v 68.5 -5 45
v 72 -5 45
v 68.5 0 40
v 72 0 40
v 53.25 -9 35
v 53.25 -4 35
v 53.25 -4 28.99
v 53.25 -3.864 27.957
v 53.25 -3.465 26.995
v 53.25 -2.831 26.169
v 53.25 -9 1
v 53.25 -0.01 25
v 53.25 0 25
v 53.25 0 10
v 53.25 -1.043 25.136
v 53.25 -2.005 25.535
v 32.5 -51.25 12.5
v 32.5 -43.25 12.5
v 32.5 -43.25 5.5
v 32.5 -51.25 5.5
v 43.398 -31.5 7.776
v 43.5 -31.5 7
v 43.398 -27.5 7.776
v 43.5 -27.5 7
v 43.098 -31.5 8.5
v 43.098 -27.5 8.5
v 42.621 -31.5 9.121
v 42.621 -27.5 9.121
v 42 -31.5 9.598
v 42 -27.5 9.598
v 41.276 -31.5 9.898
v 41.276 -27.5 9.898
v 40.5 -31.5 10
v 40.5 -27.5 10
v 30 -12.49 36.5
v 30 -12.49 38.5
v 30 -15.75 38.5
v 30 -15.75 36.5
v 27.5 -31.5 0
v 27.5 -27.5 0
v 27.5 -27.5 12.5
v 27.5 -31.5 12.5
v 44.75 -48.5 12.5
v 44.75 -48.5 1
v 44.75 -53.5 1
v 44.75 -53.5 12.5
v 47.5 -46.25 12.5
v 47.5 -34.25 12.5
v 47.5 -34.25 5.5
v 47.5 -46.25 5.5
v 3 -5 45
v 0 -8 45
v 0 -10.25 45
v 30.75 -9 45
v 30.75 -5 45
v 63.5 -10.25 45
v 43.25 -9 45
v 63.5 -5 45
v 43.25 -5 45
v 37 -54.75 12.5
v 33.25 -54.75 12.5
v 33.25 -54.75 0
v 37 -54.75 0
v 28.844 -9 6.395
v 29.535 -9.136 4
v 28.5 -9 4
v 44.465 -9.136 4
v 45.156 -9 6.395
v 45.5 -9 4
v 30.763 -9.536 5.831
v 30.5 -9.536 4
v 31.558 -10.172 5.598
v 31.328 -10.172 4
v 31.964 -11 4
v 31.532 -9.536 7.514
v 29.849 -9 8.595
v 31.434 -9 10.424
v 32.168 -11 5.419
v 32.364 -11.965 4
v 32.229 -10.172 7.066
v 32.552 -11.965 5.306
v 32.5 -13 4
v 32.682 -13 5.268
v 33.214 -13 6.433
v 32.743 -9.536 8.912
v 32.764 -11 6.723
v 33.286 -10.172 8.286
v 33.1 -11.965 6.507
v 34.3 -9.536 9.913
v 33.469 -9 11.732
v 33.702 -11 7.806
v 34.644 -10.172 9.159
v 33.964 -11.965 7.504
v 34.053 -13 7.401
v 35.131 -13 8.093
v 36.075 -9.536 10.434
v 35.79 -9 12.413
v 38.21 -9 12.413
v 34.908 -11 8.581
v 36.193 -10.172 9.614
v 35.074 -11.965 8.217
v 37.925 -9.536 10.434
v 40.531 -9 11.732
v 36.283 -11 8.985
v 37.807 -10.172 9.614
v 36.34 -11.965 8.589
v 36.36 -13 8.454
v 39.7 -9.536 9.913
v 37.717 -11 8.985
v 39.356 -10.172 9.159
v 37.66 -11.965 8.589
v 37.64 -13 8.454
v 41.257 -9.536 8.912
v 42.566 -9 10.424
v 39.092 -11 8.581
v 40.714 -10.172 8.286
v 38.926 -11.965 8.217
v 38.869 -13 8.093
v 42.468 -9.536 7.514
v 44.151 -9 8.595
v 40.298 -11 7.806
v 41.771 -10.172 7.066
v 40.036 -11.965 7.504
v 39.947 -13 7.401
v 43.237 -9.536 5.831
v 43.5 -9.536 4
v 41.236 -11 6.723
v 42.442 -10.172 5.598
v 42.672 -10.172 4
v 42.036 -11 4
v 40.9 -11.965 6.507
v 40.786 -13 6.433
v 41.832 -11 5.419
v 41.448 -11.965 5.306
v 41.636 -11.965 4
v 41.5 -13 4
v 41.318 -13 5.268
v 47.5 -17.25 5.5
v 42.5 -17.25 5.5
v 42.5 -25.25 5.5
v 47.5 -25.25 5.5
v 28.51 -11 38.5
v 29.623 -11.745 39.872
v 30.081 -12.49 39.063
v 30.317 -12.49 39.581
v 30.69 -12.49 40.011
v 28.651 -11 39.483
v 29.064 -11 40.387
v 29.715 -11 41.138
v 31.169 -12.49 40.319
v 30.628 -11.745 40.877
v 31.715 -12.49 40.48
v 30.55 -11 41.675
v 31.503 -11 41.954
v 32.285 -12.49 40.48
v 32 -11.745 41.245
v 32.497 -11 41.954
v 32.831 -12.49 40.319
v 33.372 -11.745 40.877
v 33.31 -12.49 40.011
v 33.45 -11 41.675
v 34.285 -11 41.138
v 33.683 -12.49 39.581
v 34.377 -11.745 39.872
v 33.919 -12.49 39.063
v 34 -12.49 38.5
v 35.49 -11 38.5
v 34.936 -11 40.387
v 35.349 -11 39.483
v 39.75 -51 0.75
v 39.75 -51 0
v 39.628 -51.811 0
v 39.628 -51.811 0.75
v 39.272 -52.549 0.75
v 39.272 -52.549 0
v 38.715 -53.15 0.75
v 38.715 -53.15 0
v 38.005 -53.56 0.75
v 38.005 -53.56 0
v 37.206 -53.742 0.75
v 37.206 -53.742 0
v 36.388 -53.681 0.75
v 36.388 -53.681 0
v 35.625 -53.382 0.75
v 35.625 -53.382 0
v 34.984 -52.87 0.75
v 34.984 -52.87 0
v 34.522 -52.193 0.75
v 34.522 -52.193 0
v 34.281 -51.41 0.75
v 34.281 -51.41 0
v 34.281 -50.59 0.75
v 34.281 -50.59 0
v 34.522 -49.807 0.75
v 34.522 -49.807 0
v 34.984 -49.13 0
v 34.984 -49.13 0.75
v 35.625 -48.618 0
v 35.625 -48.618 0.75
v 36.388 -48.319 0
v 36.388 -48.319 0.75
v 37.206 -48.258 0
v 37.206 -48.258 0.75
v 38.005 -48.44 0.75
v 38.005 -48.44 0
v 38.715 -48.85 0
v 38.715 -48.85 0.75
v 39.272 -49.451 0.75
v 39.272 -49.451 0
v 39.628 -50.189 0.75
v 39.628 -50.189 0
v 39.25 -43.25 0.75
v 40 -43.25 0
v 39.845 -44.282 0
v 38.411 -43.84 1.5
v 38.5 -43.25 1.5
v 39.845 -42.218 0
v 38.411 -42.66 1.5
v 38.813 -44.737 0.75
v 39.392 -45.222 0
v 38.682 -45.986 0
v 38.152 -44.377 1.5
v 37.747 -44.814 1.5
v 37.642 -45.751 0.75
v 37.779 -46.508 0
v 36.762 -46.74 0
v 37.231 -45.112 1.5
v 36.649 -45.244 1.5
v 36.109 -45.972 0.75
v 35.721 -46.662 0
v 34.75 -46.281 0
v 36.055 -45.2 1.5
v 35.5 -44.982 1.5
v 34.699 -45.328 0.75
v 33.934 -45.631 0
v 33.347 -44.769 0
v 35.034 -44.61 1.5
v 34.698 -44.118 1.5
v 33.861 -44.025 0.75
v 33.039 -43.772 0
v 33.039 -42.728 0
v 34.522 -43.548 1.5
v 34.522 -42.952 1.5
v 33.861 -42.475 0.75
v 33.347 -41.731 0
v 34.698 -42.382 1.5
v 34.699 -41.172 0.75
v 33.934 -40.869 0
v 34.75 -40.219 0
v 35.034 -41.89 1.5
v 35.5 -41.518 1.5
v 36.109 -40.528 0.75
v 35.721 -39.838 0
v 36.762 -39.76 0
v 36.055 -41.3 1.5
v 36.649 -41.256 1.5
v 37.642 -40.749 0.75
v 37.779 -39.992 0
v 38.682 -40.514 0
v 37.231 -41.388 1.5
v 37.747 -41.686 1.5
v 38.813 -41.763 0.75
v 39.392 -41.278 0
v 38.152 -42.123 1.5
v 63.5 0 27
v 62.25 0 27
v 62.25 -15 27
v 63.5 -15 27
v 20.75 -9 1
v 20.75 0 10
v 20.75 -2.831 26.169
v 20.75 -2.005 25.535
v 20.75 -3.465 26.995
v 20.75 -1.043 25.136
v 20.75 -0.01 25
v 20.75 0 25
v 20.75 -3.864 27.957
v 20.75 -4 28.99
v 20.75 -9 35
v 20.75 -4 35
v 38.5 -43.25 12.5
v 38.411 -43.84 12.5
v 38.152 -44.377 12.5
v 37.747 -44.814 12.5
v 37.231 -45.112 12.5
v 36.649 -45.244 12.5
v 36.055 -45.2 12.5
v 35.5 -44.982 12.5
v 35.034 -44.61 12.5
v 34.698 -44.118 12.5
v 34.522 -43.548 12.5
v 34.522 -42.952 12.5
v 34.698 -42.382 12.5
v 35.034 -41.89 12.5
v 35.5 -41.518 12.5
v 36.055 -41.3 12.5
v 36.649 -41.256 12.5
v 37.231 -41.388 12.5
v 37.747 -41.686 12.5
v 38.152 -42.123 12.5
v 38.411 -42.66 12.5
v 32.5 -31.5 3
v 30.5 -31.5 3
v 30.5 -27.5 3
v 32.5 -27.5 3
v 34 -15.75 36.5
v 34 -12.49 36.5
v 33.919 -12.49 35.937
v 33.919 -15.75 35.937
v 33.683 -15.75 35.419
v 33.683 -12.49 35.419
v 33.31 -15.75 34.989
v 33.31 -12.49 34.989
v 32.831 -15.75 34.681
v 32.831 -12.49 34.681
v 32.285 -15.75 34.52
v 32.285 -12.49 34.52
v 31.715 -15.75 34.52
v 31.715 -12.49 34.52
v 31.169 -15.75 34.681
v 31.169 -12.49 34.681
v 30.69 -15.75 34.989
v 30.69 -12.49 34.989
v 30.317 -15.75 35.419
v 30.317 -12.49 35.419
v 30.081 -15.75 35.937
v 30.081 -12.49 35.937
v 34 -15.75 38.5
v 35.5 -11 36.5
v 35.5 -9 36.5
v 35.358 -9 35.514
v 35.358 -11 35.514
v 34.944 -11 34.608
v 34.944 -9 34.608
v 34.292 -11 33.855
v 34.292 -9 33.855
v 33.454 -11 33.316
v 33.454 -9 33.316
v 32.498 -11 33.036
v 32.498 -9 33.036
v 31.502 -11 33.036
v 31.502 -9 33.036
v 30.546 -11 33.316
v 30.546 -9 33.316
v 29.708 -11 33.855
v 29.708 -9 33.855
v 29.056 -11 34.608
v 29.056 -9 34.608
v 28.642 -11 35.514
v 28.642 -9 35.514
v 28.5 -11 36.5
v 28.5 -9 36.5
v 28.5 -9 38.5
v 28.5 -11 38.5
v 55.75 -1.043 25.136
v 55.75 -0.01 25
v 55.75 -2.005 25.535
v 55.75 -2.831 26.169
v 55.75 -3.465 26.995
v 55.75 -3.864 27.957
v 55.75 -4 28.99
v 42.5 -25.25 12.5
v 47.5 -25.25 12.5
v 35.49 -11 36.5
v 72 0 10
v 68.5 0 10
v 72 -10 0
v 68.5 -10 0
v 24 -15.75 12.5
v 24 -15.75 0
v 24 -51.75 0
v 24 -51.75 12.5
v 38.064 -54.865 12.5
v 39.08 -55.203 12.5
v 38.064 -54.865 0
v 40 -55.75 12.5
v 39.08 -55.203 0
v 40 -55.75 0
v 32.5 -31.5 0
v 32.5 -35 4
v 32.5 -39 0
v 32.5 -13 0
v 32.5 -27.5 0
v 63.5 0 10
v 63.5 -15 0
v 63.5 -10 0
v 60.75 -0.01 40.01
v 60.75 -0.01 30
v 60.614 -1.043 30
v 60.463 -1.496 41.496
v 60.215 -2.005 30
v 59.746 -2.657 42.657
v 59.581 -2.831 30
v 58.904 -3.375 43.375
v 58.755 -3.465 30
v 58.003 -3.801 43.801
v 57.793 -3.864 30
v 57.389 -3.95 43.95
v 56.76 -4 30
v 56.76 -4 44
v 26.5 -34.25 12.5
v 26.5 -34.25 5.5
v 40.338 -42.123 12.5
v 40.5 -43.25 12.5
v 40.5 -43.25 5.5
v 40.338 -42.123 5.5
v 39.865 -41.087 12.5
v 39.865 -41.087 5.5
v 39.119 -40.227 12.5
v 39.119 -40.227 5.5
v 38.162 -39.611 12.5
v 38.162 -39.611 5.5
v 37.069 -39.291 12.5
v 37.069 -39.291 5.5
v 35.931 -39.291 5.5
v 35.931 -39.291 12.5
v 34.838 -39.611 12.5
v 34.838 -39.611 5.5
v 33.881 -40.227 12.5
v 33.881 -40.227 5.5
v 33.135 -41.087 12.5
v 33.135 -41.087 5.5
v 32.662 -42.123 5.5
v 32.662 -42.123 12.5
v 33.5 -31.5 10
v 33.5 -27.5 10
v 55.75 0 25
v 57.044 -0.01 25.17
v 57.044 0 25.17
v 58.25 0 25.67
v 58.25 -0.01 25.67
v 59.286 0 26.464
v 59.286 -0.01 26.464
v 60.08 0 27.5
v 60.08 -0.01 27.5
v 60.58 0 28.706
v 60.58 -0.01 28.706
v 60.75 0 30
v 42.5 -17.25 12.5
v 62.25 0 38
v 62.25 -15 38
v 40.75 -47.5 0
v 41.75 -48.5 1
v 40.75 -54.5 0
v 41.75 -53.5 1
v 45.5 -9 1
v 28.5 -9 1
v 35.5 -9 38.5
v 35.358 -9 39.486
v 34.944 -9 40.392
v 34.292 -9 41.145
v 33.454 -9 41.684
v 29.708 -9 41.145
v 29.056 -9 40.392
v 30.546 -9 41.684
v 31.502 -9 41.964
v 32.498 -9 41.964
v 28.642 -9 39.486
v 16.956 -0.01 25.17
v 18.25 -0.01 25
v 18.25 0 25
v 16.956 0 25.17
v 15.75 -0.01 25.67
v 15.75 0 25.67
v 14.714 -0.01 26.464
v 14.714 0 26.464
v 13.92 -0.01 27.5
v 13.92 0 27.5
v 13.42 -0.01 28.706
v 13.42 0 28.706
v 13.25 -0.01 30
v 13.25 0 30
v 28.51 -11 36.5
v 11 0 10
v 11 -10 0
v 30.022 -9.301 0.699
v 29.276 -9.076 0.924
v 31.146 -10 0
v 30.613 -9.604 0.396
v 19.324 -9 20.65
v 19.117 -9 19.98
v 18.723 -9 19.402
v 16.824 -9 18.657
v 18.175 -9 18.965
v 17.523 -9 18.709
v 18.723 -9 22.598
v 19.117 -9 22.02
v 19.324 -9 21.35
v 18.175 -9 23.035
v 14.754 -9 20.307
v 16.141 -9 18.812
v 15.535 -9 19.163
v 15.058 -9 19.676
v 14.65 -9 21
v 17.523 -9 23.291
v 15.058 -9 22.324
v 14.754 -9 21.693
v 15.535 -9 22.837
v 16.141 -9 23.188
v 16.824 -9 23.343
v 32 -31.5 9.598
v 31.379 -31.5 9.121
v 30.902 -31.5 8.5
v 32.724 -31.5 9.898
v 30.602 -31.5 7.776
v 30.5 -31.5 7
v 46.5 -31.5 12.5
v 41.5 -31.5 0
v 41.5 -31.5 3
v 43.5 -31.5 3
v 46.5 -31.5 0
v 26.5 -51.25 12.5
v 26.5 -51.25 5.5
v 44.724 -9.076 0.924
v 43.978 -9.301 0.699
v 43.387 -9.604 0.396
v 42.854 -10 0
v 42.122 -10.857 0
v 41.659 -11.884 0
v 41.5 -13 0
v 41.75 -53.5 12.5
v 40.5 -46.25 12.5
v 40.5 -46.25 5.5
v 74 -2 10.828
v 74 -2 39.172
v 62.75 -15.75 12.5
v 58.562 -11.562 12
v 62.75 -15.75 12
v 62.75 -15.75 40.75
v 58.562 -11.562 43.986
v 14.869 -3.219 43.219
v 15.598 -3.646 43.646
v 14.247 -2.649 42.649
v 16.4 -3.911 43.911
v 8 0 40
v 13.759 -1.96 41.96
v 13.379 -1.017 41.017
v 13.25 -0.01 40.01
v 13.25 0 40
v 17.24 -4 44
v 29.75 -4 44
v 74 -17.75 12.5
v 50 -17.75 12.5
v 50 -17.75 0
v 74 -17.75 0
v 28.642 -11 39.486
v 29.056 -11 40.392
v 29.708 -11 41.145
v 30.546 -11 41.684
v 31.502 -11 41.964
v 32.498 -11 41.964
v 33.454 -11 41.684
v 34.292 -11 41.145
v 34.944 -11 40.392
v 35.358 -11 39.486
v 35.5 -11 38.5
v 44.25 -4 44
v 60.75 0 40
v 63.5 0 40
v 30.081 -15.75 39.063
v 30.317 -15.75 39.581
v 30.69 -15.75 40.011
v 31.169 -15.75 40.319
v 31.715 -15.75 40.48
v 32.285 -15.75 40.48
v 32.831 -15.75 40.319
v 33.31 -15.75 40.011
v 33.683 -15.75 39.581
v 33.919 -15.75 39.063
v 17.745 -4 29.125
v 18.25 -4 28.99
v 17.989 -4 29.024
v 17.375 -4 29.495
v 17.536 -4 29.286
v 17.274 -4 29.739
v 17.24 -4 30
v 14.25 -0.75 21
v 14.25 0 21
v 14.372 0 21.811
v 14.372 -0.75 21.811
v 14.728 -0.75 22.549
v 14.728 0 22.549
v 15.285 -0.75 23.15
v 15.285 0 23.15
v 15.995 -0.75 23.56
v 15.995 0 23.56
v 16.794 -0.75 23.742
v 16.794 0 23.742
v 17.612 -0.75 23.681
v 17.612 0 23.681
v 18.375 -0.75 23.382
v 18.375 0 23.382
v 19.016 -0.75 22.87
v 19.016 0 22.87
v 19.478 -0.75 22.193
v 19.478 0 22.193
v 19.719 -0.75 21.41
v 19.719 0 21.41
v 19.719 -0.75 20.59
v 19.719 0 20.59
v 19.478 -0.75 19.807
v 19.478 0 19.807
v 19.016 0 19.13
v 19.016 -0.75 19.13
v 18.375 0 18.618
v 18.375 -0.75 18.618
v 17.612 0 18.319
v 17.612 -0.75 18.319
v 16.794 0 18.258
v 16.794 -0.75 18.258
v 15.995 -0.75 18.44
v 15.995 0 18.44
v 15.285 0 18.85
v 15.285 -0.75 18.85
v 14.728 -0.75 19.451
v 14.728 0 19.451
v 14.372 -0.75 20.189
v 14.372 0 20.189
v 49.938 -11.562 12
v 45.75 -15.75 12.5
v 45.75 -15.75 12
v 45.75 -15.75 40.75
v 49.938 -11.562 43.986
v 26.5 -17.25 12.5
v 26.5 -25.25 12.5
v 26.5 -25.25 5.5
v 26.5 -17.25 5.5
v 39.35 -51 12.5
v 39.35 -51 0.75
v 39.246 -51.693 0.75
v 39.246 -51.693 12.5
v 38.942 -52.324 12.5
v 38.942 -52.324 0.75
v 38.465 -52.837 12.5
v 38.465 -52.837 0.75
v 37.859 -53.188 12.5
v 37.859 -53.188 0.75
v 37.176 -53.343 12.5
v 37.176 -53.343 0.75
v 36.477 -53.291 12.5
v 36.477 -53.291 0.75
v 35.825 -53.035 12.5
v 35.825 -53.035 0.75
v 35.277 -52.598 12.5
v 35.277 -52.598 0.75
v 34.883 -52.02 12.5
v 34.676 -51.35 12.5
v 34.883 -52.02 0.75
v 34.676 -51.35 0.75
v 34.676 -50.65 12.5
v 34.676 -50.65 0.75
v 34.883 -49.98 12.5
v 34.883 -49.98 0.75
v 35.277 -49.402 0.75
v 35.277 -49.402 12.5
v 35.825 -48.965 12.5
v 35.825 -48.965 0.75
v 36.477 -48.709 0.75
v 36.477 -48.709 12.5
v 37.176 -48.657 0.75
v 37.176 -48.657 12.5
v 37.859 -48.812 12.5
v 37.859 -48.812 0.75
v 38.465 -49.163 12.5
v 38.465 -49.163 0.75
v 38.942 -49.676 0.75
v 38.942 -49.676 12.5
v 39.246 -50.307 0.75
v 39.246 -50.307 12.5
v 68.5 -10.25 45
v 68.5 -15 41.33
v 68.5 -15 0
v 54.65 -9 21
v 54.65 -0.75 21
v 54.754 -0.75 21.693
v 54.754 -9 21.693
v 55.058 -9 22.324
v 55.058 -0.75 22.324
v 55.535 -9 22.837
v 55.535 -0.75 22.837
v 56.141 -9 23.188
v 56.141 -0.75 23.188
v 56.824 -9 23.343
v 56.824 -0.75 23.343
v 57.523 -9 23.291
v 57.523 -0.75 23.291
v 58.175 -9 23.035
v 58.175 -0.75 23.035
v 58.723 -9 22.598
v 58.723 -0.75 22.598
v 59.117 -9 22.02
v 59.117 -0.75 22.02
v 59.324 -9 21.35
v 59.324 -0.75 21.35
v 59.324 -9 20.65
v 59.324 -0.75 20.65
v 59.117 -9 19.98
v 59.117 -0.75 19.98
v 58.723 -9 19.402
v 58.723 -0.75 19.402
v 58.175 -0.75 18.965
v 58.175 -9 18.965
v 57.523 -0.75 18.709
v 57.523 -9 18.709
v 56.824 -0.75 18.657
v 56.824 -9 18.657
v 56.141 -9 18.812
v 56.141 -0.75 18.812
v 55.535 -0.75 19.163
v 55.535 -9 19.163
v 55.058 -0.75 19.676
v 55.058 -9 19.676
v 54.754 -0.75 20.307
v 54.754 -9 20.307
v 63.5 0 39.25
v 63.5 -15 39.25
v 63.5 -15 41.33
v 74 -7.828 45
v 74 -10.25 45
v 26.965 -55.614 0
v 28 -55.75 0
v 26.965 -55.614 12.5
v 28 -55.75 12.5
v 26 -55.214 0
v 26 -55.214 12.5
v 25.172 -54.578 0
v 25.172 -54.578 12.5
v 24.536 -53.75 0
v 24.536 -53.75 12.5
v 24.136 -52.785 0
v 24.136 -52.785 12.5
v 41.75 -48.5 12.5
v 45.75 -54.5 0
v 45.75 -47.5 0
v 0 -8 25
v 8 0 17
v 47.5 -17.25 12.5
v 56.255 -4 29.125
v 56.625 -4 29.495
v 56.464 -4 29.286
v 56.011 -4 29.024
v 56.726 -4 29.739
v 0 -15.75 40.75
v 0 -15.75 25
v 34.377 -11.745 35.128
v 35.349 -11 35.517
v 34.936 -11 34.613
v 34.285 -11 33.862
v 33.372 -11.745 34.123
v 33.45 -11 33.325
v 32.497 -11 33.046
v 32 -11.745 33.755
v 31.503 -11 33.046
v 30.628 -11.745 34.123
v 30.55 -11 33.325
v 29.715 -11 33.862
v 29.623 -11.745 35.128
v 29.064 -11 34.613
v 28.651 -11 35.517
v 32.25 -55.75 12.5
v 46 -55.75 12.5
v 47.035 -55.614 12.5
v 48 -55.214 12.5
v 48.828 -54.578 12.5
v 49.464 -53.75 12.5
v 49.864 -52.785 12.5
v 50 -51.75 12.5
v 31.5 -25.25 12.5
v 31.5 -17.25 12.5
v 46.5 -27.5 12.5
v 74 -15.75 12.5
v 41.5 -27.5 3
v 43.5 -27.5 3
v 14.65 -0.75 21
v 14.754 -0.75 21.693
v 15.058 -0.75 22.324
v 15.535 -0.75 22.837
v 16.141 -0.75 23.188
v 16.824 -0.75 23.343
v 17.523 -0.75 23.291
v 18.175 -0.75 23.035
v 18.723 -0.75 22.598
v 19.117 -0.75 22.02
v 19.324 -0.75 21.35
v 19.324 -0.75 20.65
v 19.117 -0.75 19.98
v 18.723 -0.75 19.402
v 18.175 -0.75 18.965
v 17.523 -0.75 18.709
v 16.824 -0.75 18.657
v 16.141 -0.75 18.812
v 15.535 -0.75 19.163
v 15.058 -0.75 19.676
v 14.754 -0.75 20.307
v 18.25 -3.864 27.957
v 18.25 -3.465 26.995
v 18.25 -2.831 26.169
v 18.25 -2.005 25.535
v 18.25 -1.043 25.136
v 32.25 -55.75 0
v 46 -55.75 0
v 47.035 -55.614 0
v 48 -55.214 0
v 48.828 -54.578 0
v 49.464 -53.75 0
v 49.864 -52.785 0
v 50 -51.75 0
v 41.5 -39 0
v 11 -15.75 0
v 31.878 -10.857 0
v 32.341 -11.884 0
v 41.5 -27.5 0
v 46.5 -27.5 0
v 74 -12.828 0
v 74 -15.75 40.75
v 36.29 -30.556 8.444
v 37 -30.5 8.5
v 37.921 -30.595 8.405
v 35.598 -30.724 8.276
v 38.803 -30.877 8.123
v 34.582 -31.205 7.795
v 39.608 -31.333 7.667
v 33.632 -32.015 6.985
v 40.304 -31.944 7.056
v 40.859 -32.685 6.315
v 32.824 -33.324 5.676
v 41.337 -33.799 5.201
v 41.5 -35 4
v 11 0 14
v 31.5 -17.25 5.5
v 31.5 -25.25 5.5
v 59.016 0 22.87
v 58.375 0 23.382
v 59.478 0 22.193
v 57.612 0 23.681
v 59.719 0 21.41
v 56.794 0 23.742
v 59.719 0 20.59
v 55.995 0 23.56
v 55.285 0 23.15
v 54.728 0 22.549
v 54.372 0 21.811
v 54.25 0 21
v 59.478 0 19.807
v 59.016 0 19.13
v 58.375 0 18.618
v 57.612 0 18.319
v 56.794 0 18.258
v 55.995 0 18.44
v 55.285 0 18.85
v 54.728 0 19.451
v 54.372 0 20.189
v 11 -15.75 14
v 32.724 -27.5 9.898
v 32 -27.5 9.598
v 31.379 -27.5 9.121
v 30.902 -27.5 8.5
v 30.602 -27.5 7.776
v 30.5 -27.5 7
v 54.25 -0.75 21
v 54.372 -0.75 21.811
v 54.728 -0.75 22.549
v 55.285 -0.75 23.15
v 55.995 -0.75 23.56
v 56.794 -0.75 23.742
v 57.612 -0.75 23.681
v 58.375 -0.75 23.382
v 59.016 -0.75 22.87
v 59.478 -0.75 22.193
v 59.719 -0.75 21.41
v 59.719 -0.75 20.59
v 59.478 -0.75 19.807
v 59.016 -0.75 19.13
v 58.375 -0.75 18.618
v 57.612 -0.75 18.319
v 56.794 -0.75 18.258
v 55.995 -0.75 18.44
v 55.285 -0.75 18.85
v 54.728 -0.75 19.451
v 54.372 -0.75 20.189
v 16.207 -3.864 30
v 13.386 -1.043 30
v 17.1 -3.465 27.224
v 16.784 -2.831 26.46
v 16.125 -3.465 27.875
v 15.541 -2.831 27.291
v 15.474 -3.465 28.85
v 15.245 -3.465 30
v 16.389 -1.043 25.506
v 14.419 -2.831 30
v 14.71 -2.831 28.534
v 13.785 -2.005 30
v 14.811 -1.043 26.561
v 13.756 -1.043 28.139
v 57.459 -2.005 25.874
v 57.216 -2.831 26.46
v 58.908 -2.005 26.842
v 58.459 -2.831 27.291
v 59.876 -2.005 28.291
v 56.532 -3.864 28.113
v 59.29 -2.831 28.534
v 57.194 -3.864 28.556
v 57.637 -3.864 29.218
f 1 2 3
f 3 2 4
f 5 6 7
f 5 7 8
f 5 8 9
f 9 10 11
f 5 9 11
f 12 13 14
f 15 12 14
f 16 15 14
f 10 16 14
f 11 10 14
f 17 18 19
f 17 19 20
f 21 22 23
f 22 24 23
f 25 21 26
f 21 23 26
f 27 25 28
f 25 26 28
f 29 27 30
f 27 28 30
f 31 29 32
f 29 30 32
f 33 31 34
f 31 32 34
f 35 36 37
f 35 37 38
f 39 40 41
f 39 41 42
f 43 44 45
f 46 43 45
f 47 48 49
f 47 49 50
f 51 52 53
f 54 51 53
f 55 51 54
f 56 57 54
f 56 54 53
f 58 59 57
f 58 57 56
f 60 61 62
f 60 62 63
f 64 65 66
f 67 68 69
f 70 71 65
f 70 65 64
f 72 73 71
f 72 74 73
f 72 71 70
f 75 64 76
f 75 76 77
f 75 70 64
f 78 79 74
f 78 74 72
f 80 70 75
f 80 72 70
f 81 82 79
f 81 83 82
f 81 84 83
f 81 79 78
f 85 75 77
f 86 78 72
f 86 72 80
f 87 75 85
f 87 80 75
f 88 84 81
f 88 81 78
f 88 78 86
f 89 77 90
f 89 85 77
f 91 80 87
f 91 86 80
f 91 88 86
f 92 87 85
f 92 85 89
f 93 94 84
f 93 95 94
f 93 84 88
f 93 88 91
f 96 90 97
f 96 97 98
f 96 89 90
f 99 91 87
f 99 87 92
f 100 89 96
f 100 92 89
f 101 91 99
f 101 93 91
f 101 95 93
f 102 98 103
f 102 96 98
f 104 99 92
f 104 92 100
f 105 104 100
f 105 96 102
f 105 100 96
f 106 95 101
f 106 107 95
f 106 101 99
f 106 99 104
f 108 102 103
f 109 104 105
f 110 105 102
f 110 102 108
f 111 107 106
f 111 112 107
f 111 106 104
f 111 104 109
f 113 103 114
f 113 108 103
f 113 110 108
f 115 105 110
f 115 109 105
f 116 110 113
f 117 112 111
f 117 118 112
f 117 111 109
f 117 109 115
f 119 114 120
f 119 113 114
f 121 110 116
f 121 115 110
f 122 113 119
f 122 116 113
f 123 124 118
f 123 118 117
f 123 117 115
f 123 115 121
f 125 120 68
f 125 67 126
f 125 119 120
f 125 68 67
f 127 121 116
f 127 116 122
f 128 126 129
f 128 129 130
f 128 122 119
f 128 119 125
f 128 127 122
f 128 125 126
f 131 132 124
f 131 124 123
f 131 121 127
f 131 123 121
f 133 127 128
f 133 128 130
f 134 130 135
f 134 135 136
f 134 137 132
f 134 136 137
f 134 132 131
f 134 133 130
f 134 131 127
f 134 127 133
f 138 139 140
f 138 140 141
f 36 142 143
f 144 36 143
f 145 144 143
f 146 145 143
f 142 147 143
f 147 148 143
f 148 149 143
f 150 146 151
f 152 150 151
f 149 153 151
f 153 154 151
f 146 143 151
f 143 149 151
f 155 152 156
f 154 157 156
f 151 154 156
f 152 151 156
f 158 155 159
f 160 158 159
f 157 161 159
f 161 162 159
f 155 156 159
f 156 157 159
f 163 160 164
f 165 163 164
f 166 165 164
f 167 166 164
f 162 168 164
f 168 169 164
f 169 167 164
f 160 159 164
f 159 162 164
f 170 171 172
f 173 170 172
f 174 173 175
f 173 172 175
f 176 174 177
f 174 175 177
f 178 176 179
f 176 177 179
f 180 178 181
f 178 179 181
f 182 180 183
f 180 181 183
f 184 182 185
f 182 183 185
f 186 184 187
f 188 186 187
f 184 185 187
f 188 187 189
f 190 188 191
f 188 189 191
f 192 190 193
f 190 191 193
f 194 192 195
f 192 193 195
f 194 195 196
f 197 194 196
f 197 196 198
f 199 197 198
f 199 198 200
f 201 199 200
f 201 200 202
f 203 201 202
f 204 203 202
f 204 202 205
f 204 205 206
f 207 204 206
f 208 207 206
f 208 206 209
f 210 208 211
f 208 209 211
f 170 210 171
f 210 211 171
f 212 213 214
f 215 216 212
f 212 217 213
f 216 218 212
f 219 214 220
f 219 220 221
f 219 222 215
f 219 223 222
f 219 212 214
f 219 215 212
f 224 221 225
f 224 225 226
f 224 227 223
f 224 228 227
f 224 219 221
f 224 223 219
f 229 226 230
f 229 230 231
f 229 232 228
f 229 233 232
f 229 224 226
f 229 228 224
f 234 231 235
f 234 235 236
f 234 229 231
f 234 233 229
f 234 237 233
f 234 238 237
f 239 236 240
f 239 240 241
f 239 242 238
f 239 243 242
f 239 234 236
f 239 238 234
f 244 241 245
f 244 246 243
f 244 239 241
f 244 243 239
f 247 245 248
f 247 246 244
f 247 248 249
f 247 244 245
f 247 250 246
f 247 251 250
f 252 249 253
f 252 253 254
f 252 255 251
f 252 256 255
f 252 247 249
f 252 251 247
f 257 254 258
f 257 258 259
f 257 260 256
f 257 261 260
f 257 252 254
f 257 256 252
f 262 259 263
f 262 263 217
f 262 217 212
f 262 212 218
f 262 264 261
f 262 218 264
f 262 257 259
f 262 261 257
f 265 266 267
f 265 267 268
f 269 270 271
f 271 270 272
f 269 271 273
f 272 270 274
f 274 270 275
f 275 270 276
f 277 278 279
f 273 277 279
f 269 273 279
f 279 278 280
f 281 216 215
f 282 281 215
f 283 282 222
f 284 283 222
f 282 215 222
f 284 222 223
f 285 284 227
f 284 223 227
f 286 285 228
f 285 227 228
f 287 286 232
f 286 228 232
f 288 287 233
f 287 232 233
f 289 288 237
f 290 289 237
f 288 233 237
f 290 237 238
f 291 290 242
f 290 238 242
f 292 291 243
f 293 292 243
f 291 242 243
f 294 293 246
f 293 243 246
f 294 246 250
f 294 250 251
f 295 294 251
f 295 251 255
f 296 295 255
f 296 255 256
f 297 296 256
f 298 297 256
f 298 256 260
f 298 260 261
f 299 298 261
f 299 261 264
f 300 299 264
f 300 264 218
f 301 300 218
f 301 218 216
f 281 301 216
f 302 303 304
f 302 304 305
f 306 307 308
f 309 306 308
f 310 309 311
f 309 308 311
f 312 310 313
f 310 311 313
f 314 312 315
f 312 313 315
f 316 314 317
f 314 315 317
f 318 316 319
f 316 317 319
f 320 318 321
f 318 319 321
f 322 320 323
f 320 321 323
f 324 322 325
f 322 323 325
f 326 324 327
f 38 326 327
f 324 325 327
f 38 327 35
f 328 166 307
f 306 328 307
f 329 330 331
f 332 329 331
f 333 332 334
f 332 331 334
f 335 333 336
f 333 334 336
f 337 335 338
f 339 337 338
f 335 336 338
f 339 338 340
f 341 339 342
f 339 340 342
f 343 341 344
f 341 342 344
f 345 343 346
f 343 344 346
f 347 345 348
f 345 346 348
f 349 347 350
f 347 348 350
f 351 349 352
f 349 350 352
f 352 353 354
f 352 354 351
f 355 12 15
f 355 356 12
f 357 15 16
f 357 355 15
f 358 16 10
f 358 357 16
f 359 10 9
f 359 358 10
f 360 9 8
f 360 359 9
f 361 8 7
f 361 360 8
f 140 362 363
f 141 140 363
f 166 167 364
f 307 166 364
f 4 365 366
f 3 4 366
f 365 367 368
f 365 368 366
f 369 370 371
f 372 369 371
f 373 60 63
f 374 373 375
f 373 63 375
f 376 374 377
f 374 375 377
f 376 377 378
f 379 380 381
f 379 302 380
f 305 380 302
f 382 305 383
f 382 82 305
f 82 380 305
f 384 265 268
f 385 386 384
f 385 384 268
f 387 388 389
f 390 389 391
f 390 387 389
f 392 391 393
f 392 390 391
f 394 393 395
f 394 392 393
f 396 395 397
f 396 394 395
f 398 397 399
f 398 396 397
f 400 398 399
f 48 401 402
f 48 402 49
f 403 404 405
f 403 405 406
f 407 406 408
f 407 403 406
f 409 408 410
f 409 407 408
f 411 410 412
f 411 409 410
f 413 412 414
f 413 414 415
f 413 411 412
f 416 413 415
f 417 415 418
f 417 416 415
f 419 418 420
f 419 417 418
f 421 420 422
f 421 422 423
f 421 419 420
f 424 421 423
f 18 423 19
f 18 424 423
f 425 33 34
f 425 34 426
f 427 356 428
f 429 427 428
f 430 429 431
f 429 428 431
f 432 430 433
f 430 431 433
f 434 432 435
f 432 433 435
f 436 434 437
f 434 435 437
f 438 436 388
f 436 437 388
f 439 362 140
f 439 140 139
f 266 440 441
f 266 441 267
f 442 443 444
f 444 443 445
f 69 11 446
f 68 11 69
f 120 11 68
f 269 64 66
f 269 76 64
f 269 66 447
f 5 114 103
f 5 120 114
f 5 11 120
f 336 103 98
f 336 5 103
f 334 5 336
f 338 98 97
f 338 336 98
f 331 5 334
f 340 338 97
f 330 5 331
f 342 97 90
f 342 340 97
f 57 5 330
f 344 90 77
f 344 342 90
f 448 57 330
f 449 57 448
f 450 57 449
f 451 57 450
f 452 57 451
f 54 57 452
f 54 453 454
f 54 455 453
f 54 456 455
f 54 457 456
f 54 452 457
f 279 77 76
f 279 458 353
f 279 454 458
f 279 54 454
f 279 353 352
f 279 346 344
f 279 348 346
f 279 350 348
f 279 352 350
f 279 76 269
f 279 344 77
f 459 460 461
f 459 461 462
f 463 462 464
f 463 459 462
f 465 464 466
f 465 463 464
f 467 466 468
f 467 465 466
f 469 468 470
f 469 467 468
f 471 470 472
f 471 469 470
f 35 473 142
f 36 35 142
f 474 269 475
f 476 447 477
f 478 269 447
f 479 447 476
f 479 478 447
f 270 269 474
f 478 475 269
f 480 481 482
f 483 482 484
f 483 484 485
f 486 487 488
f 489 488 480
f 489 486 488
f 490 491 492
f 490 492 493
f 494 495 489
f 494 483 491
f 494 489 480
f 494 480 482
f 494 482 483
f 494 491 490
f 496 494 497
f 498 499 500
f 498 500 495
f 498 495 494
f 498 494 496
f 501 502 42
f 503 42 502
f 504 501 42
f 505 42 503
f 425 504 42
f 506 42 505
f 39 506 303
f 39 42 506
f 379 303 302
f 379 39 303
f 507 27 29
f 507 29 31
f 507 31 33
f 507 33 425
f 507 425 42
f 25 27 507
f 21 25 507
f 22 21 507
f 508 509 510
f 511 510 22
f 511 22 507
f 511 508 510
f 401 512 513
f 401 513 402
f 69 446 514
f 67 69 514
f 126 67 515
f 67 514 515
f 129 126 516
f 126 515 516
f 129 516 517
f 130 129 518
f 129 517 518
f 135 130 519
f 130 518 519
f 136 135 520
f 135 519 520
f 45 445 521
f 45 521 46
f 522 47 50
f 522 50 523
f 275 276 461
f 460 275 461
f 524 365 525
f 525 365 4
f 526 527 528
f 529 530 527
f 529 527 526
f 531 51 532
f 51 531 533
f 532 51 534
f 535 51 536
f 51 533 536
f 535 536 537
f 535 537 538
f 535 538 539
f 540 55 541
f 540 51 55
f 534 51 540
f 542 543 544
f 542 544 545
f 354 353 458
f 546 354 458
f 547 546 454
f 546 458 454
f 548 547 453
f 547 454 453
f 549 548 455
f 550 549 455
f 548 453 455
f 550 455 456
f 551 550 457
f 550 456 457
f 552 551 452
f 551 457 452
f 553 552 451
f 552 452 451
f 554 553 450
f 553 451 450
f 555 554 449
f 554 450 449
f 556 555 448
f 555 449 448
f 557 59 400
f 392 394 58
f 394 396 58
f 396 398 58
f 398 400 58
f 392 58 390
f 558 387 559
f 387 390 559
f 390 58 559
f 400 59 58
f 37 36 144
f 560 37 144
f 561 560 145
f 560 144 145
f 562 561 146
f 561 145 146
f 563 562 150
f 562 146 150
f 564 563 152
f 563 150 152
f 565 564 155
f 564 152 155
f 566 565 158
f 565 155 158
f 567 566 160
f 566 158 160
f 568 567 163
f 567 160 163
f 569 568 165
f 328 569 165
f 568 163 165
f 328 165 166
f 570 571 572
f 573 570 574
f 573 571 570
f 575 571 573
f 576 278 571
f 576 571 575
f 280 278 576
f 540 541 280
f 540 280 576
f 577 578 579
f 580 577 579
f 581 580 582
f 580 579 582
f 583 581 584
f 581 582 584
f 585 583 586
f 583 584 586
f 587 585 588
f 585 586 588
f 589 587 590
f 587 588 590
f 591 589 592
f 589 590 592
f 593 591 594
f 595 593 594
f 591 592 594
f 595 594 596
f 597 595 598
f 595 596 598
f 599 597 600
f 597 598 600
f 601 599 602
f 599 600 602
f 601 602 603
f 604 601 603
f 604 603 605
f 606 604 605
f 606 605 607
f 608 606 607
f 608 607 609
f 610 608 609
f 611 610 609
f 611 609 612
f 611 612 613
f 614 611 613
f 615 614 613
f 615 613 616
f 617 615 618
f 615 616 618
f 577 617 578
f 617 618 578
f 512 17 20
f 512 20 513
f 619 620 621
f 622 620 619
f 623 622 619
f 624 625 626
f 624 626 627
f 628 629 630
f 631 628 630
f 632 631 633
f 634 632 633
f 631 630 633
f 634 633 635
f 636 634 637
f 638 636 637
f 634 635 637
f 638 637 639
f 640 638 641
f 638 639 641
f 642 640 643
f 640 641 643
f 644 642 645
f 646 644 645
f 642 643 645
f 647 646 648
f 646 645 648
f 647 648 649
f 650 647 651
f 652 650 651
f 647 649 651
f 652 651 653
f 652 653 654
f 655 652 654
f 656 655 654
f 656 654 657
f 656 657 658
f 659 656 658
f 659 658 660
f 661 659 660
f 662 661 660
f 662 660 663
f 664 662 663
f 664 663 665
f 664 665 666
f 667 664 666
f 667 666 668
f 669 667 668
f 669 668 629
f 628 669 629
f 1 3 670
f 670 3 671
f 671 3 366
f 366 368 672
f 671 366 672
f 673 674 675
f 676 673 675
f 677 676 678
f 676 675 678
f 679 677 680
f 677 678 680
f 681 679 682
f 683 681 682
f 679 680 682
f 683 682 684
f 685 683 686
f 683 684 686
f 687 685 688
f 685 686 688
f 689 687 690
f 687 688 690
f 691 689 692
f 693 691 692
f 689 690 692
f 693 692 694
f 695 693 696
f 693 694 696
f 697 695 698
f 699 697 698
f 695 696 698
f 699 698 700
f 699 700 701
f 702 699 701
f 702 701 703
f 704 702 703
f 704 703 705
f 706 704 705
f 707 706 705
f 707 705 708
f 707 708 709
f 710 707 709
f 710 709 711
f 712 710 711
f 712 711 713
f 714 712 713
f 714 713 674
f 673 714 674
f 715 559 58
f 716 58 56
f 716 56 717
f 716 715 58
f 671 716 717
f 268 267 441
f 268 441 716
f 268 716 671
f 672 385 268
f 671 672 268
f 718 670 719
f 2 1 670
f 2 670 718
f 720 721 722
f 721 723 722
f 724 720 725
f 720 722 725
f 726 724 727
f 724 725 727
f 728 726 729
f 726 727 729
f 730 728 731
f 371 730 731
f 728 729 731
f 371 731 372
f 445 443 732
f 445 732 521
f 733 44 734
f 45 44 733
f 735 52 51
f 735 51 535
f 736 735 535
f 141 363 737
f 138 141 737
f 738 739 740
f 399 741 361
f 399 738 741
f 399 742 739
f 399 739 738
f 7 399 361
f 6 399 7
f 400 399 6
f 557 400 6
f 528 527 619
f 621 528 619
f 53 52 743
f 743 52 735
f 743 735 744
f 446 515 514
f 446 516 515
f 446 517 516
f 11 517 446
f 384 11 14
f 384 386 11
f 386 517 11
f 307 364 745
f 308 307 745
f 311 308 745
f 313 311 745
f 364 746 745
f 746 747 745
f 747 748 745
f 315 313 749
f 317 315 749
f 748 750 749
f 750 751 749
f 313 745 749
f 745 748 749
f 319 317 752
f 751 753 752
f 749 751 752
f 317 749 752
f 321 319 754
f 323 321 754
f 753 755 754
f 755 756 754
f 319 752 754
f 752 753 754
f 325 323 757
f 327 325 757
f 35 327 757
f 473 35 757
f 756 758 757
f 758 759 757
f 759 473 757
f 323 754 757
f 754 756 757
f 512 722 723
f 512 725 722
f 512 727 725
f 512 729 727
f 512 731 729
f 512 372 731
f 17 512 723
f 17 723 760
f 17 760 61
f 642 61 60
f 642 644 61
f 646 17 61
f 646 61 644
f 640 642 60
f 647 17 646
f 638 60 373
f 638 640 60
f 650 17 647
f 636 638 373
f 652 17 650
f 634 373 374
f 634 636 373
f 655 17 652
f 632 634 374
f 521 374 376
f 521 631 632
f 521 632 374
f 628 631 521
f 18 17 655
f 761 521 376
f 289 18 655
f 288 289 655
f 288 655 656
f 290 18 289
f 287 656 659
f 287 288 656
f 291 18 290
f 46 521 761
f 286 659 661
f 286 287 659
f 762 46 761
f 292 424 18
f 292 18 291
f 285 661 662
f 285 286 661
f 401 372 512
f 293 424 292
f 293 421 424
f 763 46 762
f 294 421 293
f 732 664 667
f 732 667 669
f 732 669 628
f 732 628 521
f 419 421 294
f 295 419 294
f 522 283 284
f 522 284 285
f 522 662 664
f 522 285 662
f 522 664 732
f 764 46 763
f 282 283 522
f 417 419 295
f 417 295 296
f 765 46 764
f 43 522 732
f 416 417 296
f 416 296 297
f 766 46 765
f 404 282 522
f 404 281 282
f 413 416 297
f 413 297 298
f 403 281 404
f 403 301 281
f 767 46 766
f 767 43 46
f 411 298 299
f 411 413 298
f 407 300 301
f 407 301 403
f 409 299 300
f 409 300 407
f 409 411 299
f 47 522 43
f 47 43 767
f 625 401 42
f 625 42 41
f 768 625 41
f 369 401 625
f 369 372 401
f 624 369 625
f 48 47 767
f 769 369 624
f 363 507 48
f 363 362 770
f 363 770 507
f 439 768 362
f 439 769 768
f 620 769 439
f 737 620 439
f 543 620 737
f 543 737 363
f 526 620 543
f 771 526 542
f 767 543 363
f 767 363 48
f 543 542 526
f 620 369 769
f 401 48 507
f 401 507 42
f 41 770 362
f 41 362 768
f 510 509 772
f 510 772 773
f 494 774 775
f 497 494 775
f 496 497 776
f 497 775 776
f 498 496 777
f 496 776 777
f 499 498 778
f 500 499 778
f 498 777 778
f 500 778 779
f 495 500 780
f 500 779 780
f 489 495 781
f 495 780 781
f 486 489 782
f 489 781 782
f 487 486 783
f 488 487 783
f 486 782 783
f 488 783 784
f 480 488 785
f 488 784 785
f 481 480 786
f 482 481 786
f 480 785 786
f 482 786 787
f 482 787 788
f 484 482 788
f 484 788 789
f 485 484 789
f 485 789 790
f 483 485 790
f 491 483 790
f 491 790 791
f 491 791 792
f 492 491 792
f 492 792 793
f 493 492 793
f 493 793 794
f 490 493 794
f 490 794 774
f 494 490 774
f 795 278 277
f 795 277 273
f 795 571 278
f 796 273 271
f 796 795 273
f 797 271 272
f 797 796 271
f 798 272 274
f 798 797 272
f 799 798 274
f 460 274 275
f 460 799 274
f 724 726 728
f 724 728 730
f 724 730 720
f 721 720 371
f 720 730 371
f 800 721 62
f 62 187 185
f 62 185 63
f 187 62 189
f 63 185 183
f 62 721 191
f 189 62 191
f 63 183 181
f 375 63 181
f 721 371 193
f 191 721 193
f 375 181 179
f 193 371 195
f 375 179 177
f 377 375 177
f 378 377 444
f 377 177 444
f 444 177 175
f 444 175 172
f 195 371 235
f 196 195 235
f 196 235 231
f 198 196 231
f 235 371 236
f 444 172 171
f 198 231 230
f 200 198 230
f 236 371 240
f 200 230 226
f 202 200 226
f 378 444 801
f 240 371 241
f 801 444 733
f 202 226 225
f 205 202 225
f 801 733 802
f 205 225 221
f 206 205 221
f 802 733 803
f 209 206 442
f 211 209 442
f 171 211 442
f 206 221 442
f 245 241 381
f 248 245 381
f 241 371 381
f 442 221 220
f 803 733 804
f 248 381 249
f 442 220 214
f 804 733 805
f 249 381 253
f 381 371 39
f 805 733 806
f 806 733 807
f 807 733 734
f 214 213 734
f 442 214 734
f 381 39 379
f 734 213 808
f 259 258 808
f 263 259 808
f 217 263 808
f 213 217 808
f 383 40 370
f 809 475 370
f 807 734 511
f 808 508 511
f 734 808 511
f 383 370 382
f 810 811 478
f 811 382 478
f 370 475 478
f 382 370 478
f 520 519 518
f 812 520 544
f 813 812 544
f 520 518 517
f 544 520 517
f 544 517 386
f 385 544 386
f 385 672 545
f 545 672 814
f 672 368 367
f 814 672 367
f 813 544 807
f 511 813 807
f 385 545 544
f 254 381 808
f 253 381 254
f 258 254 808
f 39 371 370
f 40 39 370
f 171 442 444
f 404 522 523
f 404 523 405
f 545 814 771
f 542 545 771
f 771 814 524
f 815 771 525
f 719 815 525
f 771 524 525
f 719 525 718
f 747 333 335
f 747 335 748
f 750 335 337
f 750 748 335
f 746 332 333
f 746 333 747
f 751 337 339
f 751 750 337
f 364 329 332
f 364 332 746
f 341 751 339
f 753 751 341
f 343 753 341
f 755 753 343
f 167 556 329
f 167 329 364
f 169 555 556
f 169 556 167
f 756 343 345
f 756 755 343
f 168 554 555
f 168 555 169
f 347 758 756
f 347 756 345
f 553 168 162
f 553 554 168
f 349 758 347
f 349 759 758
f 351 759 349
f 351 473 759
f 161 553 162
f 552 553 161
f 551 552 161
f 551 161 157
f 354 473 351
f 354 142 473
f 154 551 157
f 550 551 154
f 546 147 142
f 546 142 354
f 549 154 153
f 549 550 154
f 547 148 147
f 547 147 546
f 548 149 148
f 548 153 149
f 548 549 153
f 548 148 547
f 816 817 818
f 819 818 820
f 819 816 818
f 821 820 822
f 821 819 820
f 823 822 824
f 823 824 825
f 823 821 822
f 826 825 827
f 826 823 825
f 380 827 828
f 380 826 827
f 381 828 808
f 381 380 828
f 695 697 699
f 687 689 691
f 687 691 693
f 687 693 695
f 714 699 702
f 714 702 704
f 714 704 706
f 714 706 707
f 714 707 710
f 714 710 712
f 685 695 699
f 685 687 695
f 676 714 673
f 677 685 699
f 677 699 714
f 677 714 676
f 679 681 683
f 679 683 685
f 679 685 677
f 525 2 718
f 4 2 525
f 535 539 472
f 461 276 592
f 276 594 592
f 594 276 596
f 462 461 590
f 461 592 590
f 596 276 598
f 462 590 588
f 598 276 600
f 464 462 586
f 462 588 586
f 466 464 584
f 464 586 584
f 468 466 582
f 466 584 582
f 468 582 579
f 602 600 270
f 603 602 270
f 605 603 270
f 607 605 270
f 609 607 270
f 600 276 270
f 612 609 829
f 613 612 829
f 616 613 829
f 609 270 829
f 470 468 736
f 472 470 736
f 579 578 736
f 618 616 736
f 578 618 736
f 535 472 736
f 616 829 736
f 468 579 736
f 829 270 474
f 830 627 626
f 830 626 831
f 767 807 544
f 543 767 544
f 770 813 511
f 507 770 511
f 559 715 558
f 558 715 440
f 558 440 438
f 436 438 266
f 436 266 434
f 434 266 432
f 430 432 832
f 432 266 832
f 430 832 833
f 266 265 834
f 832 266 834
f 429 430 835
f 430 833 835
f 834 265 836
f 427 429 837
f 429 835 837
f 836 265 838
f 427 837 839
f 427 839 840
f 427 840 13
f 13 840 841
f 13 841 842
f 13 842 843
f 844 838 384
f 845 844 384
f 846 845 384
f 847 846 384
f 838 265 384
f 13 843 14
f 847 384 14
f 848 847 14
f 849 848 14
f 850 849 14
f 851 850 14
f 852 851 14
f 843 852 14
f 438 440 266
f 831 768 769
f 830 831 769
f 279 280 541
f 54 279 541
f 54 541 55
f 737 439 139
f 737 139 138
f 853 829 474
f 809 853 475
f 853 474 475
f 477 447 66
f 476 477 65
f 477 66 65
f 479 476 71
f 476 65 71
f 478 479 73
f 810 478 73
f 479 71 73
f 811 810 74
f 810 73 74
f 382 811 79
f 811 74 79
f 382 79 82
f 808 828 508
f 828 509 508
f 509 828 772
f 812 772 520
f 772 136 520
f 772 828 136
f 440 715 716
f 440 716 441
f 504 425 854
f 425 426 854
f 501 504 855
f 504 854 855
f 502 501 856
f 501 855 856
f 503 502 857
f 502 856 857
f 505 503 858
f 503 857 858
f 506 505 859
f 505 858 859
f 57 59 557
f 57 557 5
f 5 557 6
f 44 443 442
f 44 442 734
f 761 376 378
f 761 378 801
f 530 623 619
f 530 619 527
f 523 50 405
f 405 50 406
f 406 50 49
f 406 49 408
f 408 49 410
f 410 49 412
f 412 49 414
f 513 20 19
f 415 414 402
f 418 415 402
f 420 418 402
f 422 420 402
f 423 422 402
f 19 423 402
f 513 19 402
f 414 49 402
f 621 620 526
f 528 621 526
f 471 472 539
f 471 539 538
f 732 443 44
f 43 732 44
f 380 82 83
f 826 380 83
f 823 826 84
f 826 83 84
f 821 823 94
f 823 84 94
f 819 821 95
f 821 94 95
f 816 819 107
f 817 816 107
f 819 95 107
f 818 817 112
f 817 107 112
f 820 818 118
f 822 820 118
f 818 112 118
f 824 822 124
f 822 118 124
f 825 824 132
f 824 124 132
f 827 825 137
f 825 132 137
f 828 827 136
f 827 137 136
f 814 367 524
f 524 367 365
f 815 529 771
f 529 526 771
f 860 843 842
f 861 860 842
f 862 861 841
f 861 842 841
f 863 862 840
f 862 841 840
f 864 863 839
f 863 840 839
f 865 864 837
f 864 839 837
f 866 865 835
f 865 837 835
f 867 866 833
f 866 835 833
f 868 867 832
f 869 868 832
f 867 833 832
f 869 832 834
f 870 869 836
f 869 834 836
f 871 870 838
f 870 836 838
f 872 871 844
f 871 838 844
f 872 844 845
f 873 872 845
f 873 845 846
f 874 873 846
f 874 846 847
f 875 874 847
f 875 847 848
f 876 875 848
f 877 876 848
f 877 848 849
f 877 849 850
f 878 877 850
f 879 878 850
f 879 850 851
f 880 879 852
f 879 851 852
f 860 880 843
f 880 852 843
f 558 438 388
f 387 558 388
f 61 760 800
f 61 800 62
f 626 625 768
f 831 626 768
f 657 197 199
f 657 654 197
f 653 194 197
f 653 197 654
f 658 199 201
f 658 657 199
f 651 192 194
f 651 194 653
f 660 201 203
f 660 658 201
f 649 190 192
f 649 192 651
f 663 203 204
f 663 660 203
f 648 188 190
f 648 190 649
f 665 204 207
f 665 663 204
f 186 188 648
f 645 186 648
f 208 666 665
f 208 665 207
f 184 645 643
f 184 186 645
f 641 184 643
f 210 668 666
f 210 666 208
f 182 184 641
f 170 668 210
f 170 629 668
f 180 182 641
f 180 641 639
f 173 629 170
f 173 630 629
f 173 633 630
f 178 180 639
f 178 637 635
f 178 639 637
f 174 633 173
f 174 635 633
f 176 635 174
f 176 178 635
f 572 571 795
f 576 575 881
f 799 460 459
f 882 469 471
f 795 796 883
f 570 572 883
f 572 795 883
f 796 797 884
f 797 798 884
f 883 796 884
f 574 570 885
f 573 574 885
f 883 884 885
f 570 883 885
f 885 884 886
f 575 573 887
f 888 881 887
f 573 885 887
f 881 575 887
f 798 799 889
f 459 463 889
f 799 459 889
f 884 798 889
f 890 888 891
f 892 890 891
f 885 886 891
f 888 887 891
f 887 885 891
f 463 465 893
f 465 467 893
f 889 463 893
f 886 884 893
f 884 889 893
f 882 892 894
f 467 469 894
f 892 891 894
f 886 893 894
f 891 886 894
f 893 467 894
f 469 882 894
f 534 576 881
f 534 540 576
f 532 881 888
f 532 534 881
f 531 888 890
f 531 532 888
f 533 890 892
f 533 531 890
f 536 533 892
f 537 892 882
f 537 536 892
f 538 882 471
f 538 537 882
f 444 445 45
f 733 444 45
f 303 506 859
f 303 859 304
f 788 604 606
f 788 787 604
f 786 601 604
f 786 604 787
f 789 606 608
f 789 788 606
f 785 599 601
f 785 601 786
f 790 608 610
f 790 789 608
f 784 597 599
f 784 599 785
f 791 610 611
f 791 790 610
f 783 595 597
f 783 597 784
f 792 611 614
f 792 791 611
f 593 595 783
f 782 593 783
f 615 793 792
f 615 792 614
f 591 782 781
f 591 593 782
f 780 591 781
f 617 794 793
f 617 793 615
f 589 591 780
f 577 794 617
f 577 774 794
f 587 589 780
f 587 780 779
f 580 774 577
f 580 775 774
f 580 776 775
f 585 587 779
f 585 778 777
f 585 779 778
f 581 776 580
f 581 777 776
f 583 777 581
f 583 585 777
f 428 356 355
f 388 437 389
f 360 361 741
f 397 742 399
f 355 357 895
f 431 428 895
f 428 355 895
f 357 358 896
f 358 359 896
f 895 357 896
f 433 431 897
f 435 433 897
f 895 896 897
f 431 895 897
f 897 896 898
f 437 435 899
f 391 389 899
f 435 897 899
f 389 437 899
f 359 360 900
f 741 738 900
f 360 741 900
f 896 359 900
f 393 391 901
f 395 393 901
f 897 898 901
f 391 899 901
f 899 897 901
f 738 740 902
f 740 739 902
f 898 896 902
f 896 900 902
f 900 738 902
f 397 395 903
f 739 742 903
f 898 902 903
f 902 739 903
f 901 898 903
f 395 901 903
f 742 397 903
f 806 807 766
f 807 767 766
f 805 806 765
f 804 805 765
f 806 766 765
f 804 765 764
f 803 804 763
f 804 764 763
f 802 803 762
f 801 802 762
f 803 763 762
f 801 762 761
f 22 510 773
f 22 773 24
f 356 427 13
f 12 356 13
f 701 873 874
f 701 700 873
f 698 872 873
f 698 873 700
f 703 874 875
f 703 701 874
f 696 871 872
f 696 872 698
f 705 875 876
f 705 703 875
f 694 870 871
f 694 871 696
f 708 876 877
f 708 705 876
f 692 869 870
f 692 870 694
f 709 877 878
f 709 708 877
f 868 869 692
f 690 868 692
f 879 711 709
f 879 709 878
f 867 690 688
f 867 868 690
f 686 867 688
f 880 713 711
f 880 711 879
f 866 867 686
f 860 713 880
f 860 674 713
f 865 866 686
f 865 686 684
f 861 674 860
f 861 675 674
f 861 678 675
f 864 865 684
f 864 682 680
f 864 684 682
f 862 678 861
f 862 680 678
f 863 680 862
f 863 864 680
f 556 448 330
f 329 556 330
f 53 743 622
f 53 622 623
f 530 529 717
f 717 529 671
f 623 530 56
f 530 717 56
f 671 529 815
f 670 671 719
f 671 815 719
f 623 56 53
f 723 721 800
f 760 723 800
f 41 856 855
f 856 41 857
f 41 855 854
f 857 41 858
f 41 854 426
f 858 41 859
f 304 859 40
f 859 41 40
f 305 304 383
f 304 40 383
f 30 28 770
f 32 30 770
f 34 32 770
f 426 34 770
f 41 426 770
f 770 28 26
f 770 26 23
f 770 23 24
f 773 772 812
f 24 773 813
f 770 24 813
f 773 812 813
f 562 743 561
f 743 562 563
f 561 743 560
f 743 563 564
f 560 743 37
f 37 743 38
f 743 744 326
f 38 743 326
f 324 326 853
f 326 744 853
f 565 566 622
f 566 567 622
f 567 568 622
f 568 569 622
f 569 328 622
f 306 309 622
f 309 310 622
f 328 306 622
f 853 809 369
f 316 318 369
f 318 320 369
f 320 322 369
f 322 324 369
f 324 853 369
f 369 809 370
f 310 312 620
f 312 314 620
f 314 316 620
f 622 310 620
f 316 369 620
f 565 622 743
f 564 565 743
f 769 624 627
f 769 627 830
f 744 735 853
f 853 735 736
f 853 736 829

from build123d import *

# Parameters (mm, degrees)
PAD_DEPTH       = 45
SKETCH001_R     = 2
SKETCH001_R_2   = 2.35
SKETCH001_W     = 3
SKETCH001_H     = 5
SKETCH001_W_2   = 5
SKETCH001_H_2   = 15
POCKET_DEPTH    = 45.001
SKETCH002_W     = 45
SKETCH002_H     = 32.5
POCKET001_DEPTH = 74.001
POCKET002_DEPTH = 33
SKETCH004_R     = 2.35
POCKET003_DEPTH = 9
SKETCH005_W     = 47.5
SKETCH005_H     = 20
POCKET004_DEPTH = 4
POCKET005_DEPTH = 30
SKETCH007_W     = 19
SKETCH007_H     = 4
POCKET006_DEPTH = 3
POCKET007_DEPTH = 4
POCKET008_DEPTH = 55.751
POCKET009_DEPTH = 15
PAD001_DEPTH    = 9
POCKET010_DEPTH = 45.001
SKETCH013_R     = 2.75
POCKET011_DEPTH = 0.75
SKETCH014_R     = 2.75
POCKET012_DEPTH = 0.75
SKETCH015_W     = 24
SKETCH015_H     = 12.5
PAD002_DEPTH    = 2
POCKET013_DEPTH = 74.001
CHAMFER_SIZE    = 2
FILLET_R        = 4
CHAMFER001_SIZE = 1.5
CHAMFER002_SIZE = 1
FILLET001_R     = 3
FILLET002_R     = 5
FILLET003_R     = 3.99
FILLET004_R     = 4
POCKET014_DEPTH = 55.751
POCKET015_DEPTH = 2
CHAMFER003_SIZE = 1.49
SKETCH019_W     = 5
SKETCH019_H     = 8
POCKET016_DEPTH = 7


with BuildPart() as part:
    # Sketch → Pad (new body)
    with BuildSketch(Plane.XY):
        Polygon((74, -15.75), (74, 0), (0, 0), (0, -15.75), (24, -15.75), (24, -55.75), (50, -55.75), (50, -15.75), align=None)
    extrude(amount=PAD_DEPTH)

    # Sketch001 (on Face9 of Pad) → Pocket (cut, through all)
    with BuildSketch(Plane(origin=(0, 0, 0), x_dir=(1, 0, 0), z_dir=(0, 0, -1))):
        with Locations((36.5, 43.25)):
            Circle(SKETCH001_R)
        with Locations((37, 51)):
            Circle(SKETCH001_R_2)
        with Locations((43.25, 51)):
            Rectangle(SKETCH001_W, SKETCH001_H)
        Polygon((0, 8), (8, 0), (0, 0), align=None)
        with Locations((66, 7.5)):
            Rectangle(SKETCH001_W_2, SKETCH001_H_2)
    extrude(amount=-POCKET_DEPTH, mode=Mode.SUBTRACT)

    # Sketch002 (on Face1 of Pocket) → Pocket001 (cut, through all)
    with BuildSketch(Plane.YZ.offset(74)):
        with Locations((-38.25, 28.75)):
            Rectangle(SKETCH002_W, SKETCH002_H)
    extrude(amount=-POCKET001_DEPTH, mode=Mode.SUBTRACT)

    # Sketch003 (on Face4 of Pocket001) → Pocket002 (cut)
    with BuildSketch(Plane.XY.offset(45)):
        Polygon((45.75, -15.75), (49.9375, -11.5625), (58.5625, -11.5625), (62.75, -15.75), align=None)
    extrude(amount=-POCKET002_DEPTH, mode=Mode.SUBTRACT)

    # Sketch004 (on Face15 of Pocket002) → Pocket003 (cut)
    with BuildSketch(Plane(origin=(0, 0, 0), x_dir=(-1, 0, 0), z_dir=(0, 1, 0))):
        with Locations((-57, 21)):
            Circle(SKETCH004_R)
        with Locations((-17, 21)):
            Circle(SKETCH004_R)
        Polygon((-43.25, 45), (-53.25, 35), (-53.25, 0), (-20.75, 0), (-20.75, 35), (-30.75, 45), align=None)
    extrude(amount=-POCKET003_DEPTH, mode=Mode.SUBTRACT)

    # Sketch005 (on Face19 of Pocket003) → Pocket004 (cut)
    with BuildSketch(Plane(origin=(0, 0, 0), x_dir=(-1, 0, 0), z_dir=(0, 1, 0))):
        with Locations((-37, 35)):
            Rectangle(SKETCH005_W, SKETCH005_H)
    extrude(amount=-POCKET004_DEPTH, mode=Mode.SUBTRACT)

    # Sketch006 (on Face17 of Pocket004) → Pocket005 (cut)
    with BuildSketch(Plane(origin=(0, -9, 0), x_dir=(-1, 0, 0), z_dir=(0, 1, 0))):
        with BuildLine():
            ThreePointArc((-32.5, 4), (-37, 8.5), (-41.5, 4))
            Line((-41.5, 4), (-41.5, 0))
            ThreePointArc((-41.5, 0), (-37, -4.5), (-32.5, 0))
            Line((-32.5, 4), (-32.5, 0))
        make_face()
    extrude(amount=-POCKET005_DEPTH, mode=Mode.SUBTRACT)

    # Sketch007 (on Face4 of Pocket005) → Pocket006 (cut)
    with BuildSketch(Plane(origin=(0, 0, 0), x_dir=(1, 0, 0), z_dir=(0, 0, -1))):
        with Locations((37, 29.5)):
            Rectangle(SKETCH007_W, SKETCH007_H)
    extrude(amount=-POCKET006_DEPTH, mode=Mode.SUBTRACT)

    # Sketch008 (on Face23 of Pocket006) → Pocket007 (cut)
    with BuildSketch(Plane(origin=(0, -31.5, 0), x_dir=(-1, 0, 0), z_dir=(0, 1, 0))):
        Polygon((-43.5, 3), (-43.5, 10), (-30.5, 10), (-30.5, 3), (-27.5, 3), (-27.5, 12.5), (-46.5, 12.5), (-46.5, 3), align=None)
    extrude(amount=POCKET007_DEPTH, mode=Mode.SUBTRACT)

    # Sketch009 (on Face14 of Pocket007) → Pocket008 (cut, through all)
    with BuildSketch(Plane(origin=(0, 0, 0), x_dir=(-1, 0, 0), z_dir=(0, 1, 0))):
        Polygon((0, 25), (-11, 14), (-11, 0), (0, 0), align=None)
    extrude(amount=-POCKET008_DEPTH, mode=Mode.SUBTRACT)

    # Sketch010 (on Face23 of Pocket008) → Pocket009 (cut)
    with BuildSketch(Plane(origin=(0, 0, 0), x_dir=(-1, 0, 0), z_dir=(0, 1, 0))):
        Polygon((-63.5, 39.25), (-62.25, 38), (-62.25, 27), (-63.5, 27), align=None)
    extrude(amount=-POCKET009_DEPTH, mode=Mode.SUBTRACT)

    # Sketch011 (on Face15 of Pocket009) → Pad001 (join)
    with BuildSketch(Plane.YZ.offset(32.5)):
        Polygon((-39, 0), (-39, 8.5), (-30.5, 8.5), align=None)
    extrude(amount=PAD001_DEPTH)

    # Sketch012 (on Face4 of Pad001) → Pocket010 (cut, through all)
    with BuildSketch(Plane(origin=(0, 0, 0), x_dir=(1, 0, 0), z_dir=(0, 0, -1))):
        with BuildLine():
            Line((30, 58), (33.25, 54.75))
            Line((33.25, 54.75), (37, 54.75))
            ThreePointArc((37, 54.75), (40.535534, 56.214466), (42, 59.75))
            Line((30, 59.75), (42, 59.75))
            Line((30, 58), (30, 59.75))
        make_face()
    extrude(amount=-POCKET010_DEPTH, mode=Mode.SUBTRACT)

    # Sketch013 (on Face4 of Pocket010) → Pocket011 (cut)
    with BuildSketch(Plane(origin=(0, 0, 0), x_dir=(1, 0, 0), z_dir=(0, 0, -1))):
        with Locations((37, 51)):
            Circle(SKETCH013_R)
    extrude(amount=-POCKET011_DEPTH, mode=Mode.SUBTRACT)

    # Sketch014 (on Face30 of Pocket011) → Pocket012 (cut)
    with BuildSketch(Plane(origin=(0, 0, 0), x_dir=(-1, 0, 0), z_dir=(0, 1, 0))):
        with Locations((-57, 21)):
            Circle(SKETCH014_R)
        with Locations((-17, 21)):
            Circle(SKETCH014_R)
    extrude(amount=-POCKET012_DEPTH, mode=Mode.SUBTRACT)

    # Sketch015 (on Face2 of Pocket012) → Pad002 (join)
    with BuildSketch(Plane.XZ.offset(15.75)):
        with Locations((62, 6.25)):
            Rectangle(SKETCH015_W, SKETCH015_H)
    extrude(amount=PAD002_DEPTH)

    # Sketch016 (on Face62 of Pad002) → Pocket013 (cut, through all)
    with BuildSketch(Plane.YZ.offset(74)):
        Polygon((-10, 0), (0, 10), (0, 0), align=None)
        Polygon((-5, 45), (0, 40), (0, 45), align=None)
        Polygon((-15.75, 40.75), (-10.25, 45), (-15.75, 45), align=None)
    extrude(amount=-POCKET013_DEPTH, mode=Mode.SUBTRACT)

    # Chamfer
    chamfer_edges = [part.edges().sort_by_distance(p)[0] for p in [
        (74, 0, 25),
        (74, -5, 5),
        (74, -2.5, 42.5),
    ]]
    chamfer(chamfer_edges, length=CHAMFER_SIZE)

    # Fillet
    fillet_edges = [part.edges().sort_by_distance(p)[0] for p in [
        (37, -9, 8.5),
    ]]
    fillet(fillet_edges, radius=FILLET_R)

    # Chamfer001
    chamfer001_edges = [part.edges().sort_by_distance(p)[0] for p in [
        (34.5, -43.25, 0),
    ]]
    chamfer(chamfer001_edges, length=CHAMFER001_SIZE)

    # Chamfer002
    chamfer002_edges = [part.edges().sort_by_distance(p)[0] for p in [
        (41.75, -51, 0),
        (43.25, -53.5, 0),
        (44.75, -51, 0),
        (43.25, -48.5, 0),
    ]]
    chamfer(chamfer002_edges, length=CHAMFER002_SIZE)

    # Fillet001
    fillet001_edges = [part.edges().sort_by_distance(p)[0] for p in [
        (43.5, -29.5, 10),
        (30.5, -29.5, 10),
    ]]
    fillet(fillet001_edges, radius=FILLET001_R)

    # Fillet002
    fillet002_edges = [part.edges().sort_by_distance(p)[0] for p in [
        (13.25, -2, 25),
        (60.75, -2, 25),
    ]]
    fillet(fillet002_edges, radius=FILLET002_R)

    # Fillet003
    fillet003_edges = [part.edges().sort_by_distance(p)[0] for p in [
        (13.25, -4, 37),
        (60.75, -4, 37),
    ]]
    fillet(fillet003_edges, radius=FILLET003_R)

    # Fillet004
    fillet004_edges = [part.edges().sort_by_distance(p)[0] for p in [
        (24, -55.75, 6.25),
        (50, -55.75, 6.25),
    ]]
    fillet(fillet004_edges, radius=FILLET004_R)

    # Sketch017 (on Face56 of Fillet004) → Pocket014 (cut, through all)
    with BuildSketch(Plane(origin=(0, 0, 0), x_dir=(-1, 0, 0), z_dir=(0, 1, 0))):
        with BuildLine():
            ThreePointArc((-30, 38.5), (-32, 40.5), (-34, 38.5))
            Line((-34, 38.5), (-34, 36.5))
            ThreePointArc((-34, 36.5), (-32, 34.5), (-30, 36.5))
            Line((-30, 38.5), (-30, 36.5))
        make_face()
    extrude(amount=-POCKET014_DEPTH, mode=Mode.SUBTRACT)

    # Sketch018 (on Face50 of Pocket014) → Pocket015 (cut)
    with BuildSketch(Plane(origin=(0, -9, 0), x_dir=(-1, 0, 0), z_dir=(0, 1, 0))):
        with BuildLine():
            ThreePointArc((-28.5, 38.5), (-32, 42), (-35.5, 38.5))
            Line((-35.5, 38.5), (-35.5, 36.5))
            ThreePointArc((-35.5, 36.5), (-32, 33), (-28.5, 36.5))
            Line((-28.5, 38.5), (-28.5, 36.5))
        make_face()
    extrude(amount=-POCKET015_DEPTH, mode=Mode.SUBTRACT)

    # Chamfer003
    chamfer003_edges = [part.edges().sort_by_distance(p)[0] for p in [
        (32, -11, 40.5),
    ]]
    chamfer(chamfer003_edges, length=CHAMFER003_SIZE)

    # Sketch019 (on Face10 of Chamfer003) → Pocket016 (cut)
    with BuildSketch(Plane.XY.offset(12.5)):
        with BuildLine():
            Line((26.5, -51.25), (26.5, -34.25))
            Line((26.5, -34.25), (47.5, -34.25))
            Line((47.5, -34.25), (47.5, -46.25))
            Line((47.5, -46.25), (40.5, -46.25))
            Line((40.5, -46.25), (40.5, -43.25))
            ThreePointArc((40.5, -43.25), (36.5, -39.25), (32.5, -43.25))
            Line((32.5, -43.25), (32.5, -51.25))
            Line((32.5, -51.25), (26.5, -51.25))
        make_face()
        with Locations((29, -21.25)):
            Rectangle(SKETCH019_W, SKETCH019_H)
        with Locations((45, -21.25)):
            Rectangle(SKETCH019_W, SKETCH019_H)
    extrude(amount=-POCKET016_DEPTH, mode=Mode.SUBTRACT)


solid = part.part
